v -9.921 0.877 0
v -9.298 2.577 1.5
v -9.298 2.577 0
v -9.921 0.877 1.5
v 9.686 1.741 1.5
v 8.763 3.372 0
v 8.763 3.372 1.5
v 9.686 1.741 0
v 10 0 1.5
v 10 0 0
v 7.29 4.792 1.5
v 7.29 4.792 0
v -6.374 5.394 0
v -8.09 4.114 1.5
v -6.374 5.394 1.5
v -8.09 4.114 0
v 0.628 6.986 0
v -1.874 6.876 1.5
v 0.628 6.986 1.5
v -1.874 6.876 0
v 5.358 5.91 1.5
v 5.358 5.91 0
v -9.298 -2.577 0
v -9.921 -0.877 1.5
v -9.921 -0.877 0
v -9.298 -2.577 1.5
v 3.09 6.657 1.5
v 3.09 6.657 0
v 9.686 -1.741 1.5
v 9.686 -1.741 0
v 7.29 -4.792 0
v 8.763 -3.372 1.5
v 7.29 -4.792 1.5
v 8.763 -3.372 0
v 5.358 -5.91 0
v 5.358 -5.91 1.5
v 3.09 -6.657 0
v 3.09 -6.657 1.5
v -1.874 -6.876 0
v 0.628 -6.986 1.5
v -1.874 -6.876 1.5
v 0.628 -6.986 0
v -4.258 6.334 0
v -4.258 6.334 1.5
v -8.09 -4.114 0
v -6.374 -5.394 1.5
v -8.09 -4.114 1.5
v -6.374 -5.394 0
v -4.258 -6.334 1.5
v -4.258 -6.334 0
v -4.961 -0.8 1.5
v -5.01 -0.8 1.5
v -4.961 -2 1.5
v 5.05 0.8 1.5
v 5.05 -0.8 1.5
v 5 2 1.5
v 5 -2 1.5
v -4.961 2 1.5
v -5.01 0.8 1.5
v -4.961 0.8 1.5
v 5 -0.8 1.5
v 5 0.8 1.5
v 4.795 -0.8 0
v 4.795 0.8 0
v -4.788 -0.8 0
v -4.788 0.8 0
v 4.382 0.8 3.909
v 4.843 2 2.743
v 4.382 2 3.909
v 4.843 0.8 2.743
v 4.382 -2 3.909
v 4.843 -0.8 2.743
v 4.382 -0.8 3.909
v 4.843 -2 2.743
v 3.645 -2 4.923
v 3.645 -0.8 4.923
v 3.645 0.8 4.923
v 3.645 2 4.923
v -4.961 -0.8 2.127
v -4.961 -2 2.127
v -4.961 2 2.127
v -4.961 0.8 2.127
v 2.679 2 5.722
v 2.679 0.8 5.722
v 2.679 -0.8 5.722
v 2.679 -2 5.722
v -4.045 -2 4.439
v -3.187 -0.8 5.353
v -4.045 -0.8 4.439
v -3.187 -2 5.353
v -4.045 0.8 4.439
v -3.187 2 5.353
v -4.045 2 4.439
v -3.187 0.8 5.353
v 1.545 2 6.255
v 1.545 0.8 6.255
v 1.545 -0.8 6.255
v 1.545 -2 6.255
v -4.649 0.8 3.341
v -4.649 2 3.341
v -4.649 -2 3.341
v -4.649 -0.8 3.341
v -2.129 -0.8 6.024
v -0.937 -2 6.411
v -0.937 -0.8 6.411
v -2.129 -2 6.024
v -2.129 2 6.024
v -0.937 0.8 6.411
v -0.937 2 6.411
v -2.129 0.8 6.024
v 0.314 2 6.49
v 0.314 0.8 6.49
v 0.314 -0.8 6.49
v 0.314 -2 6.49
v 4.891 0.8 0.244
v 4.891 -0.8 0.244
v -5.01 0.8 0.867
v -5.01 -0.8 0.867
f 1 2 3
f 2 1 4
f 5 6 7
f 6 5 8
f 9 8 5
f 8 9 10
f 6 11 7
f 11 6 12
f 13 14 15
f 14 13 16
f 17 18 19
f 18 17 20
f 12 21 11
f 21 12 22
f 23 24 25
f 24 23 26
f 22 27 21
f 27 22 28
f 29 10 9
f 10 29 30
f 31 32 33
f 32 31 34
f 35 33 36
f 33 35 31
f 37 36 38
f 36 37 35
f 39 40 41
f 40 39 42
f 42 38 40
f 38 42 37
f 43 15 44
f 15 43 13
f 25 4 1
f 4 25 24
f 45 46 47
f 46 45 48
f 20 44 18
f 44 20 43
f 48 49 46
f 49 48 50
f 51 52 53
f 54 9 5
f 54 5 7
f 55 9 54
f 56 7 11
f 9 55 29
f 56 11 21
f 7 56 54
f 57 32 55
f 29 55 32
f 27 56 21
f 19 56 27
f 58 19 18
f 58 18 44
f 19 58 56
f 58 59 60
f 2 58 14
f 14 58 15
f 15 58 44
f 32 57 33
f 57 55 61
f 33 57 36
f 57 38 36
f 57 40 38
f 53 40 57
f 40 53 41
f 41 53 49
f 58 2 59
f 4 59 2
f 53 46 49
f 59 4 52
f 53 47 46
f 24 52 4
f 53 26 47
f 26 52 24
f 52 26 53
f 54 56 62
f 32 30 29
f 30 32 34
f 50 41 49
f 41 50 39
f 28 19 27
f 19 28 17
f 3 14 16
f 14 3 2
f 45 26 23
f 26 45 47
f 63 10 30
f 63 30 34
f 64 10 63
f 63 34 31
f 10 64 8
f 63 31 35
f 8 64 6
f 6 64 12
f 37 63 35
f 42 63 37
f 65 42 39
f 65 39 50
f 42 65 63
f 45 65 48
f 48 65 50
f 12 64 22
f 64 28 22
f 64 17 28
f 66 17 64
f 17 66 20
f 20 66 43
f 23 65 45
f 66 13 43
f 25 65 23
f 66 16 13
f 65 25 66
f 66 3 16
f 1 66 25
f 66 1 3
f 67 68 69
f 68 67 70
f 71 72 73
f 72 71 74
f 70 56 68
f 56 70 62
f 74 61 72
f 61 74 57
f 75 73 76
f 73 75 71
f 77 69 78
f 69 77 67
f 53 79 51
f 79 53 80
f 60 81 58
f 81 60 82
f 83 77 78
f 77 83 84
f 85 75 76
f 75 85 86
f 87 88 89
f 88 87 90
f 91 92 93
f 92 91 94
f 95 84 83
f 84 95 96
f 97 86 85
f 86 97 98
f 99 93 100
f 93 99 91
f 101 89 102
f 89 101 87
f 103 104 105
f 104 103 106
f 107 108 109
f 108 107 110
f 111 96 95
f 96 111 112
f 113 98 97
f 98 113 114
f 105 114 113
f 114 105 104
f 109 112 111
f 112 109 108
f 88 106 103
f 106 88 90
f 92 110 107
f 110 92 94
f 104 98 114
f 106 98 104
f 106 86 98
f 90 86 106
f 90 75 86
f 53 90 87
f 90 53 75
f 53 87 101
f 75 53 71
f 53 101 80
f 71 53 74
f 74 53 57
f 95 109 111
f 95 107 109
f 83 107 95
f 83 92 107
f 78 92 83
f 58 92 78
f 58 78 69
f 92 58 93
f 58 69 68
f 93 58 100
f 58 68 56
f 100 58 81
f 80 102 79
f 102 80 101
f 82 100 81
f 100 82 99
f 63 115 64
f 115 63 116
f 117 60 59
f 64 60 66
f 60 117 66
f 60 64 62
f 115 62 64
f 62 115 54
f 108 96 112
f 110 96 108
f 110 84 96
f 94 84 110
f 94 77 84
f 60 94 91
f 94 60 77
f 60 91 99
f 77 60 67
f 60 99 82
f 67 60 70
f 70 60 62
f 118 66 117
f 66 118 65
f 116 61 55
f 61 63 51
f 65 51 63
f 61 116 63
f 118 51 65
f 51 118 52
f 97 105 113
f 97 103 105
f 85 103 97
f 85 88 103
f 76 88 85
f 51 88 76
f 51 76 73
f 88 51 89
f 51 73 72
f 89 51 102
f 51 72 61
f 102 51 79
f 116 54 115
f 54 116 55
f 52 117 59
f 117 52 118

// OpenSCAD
/*
 * Simple Display Stand, v1.0
 *
 * by Alex Franke (CodeCreations), Jun 2012
 * http://www.theFrankes.com
 * 
 * Licenced under Creative Commons Attribution - Non-Commercial - Share Alike 3.0 
 * 
 * DESCRIPTION: This simple display stand was modeled after one included with a 
 *   box of Shrinky Dinks toys (http://www.shrinkydinks.com/ -- You should go out and
 *   buy lots of these, because they're loads of fun and the kids will have a blast!)
 *   The default size will fit a standard shrunken Shrinky Dinks piece. It's parametric, 
 *   though, so you can change the size to fit other stuff as well. 
 * 
 * INSTRUCTIONS: Choose some values in the "User-defined values" section, render,
 *   and print.  
 * 
 * v1.0, Jun 8, 2012: Initial Release.
 * 
 * TODO: 
 *   * nothing yet...  
 */

/////////////////////////////////////////////////////////////////////////////
// User-defined values... 
/////////////////////////////////////////////////////////////////////////////
baseThickness = 1.5;   // The thickness of the base
baseWidth = 14;        // The width of the base oval 
baseLength = 20;       // The length of the base oval

tabThickness = 1.2;    // The thickness of each vertical "tab"
tabRadius = 5;         // The radius of the vertical tabs. 
tabSeparation = 1.6;   // How far apart the tabs are 

$fn=25;                // Quality of circles 


/////////////////////////////////////////////////////////////////////////////
// The code... 
/////////////////////////////////////////////////////////////////////////////
rotate([90,0,0]) 
difference() {
	union() {
		rotate([-90,0,0]) 
			translate([0,0,baseThickness/2]) 
				scale([baseLength/baseWidth,1,1])
					cylinder(h=baseThickness, r=baseWidth/2, center=true) ;

		translate([0,baseThickness,0]) 
			cylinder(h=(tabThickness*2)+tabSeparation, r=tabRadius, center=true);
	}	

	// cut groove a bit bigger so it renders well 
	translate([0,baseThickness,0]) 
		cylinder(h=tabSeparation, r=tabRadius * 1.01, center=true); 

	// remove bottom 
	rotate([-90,0,0]) 
		translate([0,0,-tabRadius/2] ) 
			scale([baseLength/baseWidth,1,1])
				cylinder(h=tabRadius, r=baseWidth/2, center=true) ;
}
